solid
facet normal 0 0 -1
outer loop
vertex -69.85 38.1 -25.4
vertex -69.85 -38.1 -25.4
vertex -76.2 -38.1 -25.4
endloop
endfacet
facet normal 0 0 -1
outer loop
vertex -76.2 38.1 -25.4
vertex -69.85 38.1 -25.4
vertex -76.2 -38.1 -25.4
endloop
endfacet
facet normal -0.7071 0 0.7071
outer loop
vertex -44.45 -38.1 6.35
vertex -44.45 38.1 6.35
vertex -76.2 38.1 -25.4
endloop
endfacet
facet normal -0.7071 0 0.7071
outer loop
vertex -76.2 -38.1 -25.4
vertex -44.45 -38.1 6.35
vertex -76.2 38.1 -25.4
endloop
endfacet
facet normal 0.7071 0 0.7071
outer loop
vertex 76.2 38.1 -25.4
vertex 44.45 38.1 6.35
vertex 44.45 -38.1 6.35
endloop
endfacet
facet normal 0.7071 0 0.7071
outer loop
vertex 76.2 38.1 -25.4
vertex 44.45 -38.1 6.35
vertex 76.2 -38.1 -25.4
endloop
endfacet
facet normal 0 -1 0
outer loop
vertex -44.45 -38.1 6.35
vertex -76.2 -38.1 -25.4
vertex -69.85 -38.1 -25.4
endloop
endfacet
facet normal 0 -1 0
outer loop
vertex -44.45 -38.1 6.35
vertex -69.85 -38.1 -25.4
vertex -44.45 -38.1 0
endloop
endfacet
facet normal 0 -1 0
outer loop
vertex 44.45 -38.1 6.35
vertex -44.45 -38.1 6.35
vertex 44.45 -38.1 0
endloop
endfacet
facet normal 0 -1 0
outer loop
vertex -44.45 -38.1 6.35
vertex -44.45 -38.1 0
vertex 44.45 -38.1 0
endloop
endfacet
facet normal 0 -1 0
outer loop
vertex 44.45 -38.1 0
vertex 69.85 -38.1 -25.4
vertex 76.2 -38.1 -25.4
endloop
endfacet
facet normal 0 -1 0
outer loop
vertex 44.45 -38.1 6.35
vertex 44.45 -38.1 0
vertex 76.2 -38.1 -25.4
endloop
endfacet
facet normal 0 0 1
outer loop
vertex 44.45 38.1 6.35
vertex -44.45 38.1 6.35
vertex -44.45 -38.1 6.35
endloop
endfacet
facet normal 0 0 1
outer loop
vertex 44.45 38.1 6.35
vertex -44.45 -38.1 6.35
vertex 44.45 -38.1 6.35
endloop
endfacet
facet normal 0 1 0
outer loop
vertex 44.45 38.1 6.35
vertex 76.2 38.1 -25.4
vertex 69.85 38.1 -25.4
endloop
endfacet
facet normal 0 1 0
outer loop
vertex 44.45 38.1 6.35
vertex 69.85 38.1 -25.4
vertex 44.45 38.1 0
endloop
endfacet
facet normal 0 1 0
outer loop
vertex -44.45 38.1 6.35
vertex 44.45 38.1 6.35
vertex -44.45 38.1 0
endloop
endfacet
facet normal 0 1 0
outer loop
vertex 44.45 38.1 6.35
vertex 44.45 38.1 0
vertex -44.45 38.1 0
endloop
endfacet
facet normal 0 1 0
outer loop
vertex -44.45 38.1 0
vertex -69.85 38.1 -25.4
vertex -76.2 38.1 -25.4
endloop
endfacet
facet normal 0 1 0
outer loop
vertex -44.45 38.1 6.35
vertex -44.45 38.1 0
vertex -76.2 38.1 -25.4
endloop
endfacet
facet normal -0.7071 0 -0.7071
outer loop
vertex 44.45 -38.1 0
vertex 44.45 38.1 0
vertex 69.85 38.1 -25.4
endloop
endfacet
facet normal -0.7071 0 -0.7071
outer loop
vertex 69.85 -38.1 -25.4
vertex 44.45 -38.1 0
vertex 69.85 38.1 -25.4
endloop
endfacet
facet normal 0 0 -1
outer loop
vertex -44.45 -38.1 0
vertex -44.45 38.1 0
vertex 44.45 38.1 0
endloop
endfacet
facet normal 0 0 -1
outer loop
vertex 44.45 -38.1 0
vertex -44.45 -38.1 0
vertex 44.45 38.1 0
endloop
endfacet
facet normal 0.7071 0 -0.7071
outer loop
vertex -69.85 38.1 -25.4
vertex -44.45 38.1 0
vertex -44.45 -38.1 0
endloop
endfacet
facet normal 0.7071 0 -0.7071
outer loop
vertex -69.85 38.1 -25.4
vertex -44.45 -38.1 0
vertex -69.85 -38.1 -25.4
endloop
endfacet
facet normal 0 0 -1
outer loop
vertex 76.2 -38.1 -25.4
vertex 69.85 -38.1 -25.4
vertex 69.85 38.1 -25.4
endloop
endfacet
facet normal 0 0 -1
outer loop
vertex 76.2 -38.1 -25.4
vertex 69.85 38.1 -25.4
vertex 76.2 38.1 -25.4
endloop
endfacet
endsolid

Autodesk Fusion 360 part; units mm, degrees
sketch "Sketch1" plane through (0, 0, 0) normal (0, 0, 1) x (1, 0, 0)
  line L0 (44.45, 38.1) -> (-44.45, 38.1)
  line L1 (-44.45, 38.1) -> (-44.45, -38.1)
  line L2 (-44.45, -38.1) -> (44.45, -38.1)
  line L3 (44.45, -38.1) -> (44.45, 38.1)
  line L4 (44.45, 38.1) -> (-44.45, -38.1) construction
  line L5 (-44.45, 38.1) -> (44.45, -38.1) construction
  dimension "d1" = 88.9
  dimension "d2" = 76.2
extrude "Extrude1" add sketch "Sketch1" along normal blind 6.35
sketch "Sketch2" plane through (0, 0, 0) normal (0, 1, 0) x (1, 0, 0)
  line L0 (44.45, -6.35) -> (76.2, 25.4)
  line L1 (44.45, 0) -> (69.85, 25.4)
  line L2 (69.85, 25.4) -> (76.2, 25.4)
  line L3 (0, -50.8) -> (0, 63.5)
  line L4 (-69.85, 25.4) -> (-76.2, 25.4)
  line L5 (-44.45, 0) -> (-69.85, 25.4)
  line L6 (-44.45, -6.35) -> (-76.2, 25.4)
  line L7 (-44.45, -6.35) -> (-44.45, 0)
  line L8 (44.45, -6.35) -> (44.45, 0)
extrude "Extrude2" add sketch "Sketch2" along normal blind 38.1 and the other way blind 38.1
